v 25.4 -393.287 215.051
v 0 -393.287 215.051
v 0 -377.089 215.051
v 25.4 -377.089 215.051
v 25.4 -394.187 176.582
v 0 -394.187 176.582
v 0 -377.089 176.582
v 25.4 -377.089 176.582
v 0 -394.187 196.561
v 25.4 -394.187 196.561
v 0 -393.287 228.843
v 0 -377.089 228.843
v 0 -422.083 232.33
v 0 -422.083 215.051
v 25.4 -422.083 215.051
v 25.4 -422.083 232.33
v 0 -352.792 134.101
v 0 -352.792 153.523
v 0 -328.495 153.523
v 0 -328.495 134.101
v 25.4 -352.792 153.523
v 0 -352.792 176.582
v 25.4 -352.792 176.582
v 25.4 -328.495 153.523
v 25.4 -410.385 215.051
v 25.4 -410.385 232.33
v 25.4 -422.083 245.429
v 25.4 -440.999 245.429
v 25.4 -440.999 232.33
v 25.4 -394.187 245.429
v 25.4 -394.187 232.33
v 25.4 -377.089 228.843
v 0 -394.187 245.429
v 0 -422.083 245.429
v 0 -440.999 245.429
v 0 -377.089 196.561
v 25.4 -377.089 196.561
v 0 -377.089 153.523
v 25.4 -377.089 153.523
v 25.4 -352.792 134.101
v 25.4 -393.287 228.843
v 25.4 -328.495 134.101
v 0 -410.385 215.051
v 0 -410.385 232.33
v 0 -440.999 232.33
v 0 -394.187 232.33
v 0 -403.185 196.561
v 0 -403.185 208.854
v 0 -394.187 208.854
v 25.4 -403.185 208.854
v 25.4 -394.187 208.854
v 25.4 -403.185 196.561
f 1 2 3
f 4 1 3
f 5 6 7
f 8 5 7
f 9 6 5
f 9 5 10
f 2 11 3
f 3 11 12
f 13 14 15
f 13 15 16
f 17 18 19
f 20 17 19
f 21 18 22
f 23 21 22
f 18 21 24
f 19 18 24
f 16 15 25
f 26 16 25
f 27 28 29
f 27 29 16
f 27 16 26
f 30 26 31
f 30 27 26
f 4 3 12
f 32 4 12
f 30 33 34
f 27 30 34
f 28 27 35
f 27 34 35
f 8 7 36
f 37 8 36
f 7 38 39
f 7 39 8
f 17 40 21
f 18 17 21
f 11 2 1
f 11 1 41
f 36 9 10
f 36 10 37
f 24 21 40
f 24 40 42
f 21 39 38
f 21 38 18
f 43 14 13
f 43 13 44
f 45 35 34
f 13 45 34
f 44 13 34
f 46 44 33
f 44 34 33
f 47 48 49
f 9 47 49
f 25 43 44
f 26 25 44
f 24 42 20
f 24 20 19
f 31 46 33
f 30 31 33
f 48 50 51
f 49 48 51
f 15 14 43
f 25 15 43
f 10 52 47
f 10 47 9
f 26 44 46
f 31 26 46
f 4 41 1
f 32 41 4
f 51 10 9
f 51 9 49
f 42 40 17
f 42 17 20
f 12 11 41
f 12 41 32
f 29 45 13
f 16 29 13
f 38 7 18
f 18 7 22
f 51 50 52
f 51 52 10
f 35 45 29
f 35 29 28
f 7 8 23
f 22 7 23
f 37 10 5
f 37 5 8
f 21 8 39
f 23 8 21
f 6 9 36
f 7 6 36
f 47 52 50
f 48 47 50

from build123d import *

# Parameters (mm, degrees)
F0_W     = 18.9157426357
F0_H     = 13.0982249975
F0_W_2   = 11.6984546185
F0_H_2   = 17.2792971134
F1_DEPTH = 25.4
F0_W_3   = 24.296849966
F0_H_3   = 19.4220989943
F0_W_4   = 24.2968201637
F0_H_4   = 23.0589210987
F0_W_5   = 17.0978307724
F0_H_5   = 19.9789553881
F0_W_6   = 8.998811245
F0_H_6   = 12.2926384211
F0_W_7   = 16.1979496479
F0_H_7   = 13.7916654348


with BuildPart() as f1:
    # F0 (on Right) → F1 (new body)
    with BuildSketch(Plane.YZ):
        with Locations((-431.5408319235, 238.8794645667)):
            Rectangle(F0_W, F0_H)
        Polygon((-394.1865861416, 245.4285770655), (-422.0829606056, 245.4285770655), (-422.0829606056, 232.3303520679), (-410.3845059872, 232.3303520679), (-394.1865861416, 232.3303520679), align=None)
        with Locations((-416.2337332964, 223.6907035112)):
            Rectangle(F0_W_2, F0_H_2)
    extrude(amount=F1_DEPTH)


with BuildPart() as f1b:
    # F0 (on Right) → F1, piece 2 (new body)
    with BuildSketch(Plane.YZ):
        with Locations((-340.6435102224, 143.8122168183)):
            Rectangle(F0_W_3, F0_H_3)
    extrude(amount=F1_DEPTH)


with BuildPart() as f1c:
    # F0 (on Right) → F1, piece 3 (new body)
    with BuildSketch(Plane.YZ):
        with Locations((-364.9403452873, 165.0527268648)):
            Rectangle(F0_W_4, F0_H_4)
    extrude(amount=F1_DEPTH)


with BuildPart() as f1d:
    # F0 (on Right) → F1, piece 4 (new body)
    with BuildSketch(Plane.YZ):
        with Locations((-385.6376707554, 186.5716651082)):
            Rectangle(F0_W_5, F0_H_5)
    extrude(amount=F1_DEPTH)


with BuildPart() as f1e:
    # F0 (on Right) → F1, piece 5 (new body)
    with BuildSketch(Plane.YZ):
        with Locations((-398.6859917641, 202.7074620128)):
            Rectangle(F0_W_6, F0_H_6)
    extrude(amount=F1_DEPTH)


with BuildPart() as f1f:
    # F0 (on Right) → F1, piece 6 (new body)
    with BuildSketch(Plane.YZ):
        with Locations((-385.1877301931, 221.9468876719)):
            Rectangle(F0_W_7, F0_H_7)
    extrude(amount=F1_DEPTH)


solid = Compound([f1.part, f1b.part, f1c.part, f1d.part, f1e.part, f1f.part])
